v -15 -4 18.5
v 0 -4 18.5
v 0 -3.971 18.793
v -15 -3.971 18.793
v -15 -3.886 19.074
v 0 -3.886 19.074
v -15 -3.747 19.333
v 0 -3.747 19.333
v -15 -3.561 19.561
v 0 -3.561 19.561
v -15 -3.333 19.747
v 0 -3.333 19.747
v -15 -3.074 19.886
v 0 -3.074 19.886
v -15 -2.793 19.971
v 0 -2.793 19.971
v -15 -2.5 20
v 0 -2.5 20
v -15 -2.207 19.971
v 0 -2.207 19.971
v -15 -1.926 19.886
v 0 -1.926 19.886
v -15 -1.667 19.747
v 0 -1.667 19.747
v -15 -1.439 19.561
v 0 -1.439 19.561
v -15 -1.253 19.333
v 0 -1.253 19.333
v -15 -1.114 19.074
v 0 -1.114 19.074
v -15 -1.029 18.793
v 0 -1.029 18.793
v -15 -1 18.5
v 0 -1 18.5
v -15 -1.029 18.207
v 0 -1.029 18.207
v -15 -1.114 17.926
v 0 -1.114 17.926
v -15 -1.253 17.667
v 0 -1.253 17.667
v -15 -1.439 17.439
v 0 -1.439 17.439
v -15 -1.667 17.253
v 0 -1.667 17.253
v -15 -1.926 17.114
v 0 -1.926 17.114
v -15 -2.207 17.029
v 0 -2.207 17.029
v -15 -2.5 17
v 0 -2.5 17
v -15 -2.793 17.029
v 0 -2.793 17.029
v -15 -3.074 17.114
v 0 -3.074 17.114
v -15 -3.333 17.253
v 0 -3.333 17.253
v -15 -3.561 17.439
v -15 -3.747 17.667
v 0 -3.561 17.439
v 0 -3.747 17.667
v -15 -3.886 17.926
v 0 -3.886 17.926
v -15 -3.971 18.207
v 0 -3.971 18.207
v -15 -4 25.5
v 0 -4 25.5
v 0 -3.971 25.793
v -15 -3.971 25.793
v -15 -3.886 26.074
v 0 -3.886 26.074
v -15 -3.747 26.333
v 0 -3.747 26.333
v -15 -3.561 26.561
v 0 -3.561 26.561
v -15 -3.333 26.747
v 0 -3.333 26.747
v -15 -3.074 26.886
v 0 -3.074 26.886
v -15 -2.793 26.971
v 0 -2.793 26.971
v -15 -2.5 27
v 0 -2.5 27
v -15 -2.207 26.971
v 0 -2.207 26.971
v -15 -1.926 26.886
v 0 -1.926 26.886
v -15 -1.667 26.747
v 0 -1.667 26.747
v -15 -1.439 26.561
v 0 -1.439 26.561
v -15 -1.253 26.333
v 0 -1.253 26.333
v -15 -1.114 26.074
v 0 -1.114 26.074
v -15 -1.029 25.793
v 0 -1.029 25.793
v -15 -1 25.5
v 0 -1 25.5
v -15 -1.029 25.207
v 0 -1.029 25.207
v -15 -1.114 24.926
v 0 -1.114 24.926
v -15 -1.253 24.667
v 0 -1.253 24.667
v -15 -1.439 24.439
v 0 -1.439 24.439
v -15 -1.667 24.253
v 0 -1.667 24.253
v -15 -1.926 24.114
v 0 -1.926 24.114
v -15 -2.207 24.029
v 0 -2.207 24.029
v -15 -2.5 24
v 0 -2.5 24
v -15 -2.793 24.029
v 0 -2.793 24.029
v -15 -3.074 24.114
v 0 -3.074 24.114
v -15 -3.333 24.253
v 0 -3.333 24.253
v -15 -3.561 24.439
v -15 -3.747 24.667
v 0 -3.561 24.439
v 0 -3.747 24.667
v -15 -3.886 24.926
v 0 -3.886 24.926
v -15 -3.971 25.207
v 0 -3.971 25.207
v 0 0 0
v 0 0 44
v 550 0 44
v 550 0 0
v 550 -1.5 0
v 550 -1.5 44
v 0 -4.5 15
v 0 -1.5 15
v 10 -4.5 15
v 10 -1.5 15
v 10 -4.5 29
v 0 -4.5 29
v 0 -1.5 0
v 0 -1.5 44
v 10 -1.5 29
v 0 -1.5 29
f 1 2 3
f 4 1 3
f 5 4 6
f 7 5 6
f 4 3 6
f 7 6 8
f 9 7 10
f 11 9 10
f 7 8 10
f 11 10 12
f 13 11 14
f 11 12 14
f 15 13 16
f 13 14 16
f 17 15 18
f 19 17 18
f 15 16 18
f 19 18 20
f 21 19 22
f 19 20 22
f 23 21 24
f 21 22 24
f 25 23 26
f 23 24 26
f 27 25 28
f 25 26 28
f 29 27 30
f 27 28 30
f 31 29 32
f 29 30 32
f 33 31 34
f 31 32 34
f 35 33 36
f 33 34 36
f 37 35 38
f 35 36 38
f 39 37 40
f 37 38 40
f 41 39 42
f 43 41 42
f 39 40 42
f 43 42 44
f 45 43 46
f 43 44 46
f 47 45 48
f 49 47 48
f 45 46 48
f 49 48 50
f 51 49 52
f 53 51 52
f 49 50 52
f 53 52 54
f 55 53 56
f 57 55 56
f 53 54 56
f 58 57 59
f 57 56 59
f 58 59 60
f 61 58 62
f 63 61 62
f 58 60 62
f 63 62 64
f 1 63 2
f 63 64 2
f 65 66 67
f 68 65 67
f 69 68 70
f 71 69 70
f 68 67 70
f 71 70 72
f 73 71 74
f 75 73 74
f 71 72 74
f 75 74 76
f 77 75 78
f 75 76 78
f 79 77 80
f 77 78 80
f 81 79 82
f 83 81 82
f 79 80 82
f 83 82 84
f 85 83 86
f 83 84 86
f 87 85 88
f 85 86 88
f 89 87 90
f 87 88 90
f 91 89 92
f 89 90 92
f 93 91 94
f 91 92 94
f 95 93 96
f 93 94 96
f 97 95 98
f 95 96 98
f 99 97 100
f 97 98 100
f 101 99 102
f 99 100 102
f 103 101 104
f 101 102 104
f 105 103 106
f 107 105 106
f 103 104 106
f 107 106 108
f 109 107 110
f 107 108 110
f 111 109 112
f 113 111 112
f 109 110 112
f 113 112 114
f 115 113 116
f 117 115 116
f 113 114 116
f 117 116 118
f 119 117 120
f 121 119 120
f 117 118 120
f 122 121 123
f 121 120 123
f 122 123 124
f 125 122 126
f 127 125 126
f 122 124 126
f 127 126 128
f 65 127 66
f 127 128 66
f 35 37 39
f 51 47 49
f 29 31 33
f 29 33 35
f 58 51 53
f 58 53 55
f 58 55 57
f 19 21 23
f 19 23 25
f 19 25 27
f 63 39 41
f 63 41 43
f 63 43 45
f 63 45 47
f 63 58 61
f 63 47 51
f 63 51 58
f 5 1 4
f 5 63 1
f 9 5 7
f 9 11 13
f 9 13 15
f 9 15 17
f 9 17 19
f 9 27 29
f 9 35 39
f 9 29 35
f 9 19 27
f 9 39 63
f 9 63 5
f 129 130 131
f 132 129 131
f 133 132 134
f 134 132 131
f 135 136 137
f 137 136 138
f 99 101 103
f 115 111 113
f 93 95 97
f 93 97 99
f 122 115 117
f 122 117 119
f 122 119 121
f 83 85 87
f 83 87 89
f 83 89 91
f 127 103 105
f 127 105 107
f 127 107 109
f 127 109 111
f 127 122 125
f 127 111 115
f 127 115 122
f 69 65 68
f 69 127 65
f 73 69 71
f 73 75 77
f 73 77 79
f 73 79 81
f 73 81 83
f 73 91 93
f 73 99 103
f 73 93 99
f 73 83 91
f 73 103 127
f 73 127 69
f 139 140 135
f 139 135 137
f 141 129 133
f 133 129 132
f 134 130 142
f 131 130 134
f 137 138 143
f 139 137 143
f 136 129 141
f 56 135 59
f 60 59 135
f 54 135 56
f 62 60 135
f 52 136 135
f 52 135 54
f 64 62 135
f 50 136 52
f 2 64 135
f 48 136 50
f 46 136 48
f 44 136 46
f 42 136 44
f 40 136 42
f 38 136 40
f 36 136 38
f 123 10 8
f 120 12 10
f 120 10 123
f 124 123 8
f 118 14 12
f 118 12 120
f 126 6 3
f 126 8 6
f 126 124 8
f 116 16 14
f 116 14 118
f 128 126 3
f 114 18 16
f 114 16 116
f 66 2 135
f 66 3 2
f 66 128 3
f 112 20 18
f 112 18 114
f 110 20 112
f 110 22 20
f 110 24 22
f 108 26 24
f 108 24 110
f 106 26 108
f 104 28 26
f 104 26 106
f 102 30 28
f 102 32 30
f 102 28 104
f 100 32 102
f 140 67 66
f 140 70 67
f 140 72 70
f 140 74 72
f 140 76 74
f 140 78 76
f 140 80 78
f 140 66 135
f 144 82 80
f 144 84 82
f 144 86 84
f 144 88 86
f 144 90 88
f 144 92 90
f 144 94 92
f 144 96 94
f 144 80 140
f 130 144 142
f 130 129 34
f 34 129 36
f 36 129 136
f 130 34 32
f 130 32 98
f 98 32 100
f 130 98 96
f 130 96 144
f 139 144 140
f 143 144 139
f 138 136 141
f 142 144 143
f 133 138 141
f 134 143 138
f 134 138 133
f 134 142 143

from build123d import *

# Parameters (mm, degrees)
F0_W     = 550
F0_H     = 44
F1_DEPTH = 1.5
F2_W     = 10
F2_H     = 14
F3_DEPTH = 3
F4_R     = 1.5
F5_DEPTH = 15


with BuildPart() as f1:
    # F0 (on Front) → F1 (new body)
    with BuildSketch(Plane.XZ):
        with Locations((275, 22)):
            Rectangle(F0_W, F0_H)
    extrude(amount=F1_DEPTH)

    # F2 (on face) → F3 (join)
    with BuildSketch(Plane.XZ.offset(1.5)):
        with Locations((5, 22)):
            Rectangle(F2_W, F2_H)
    extrude(amount=F3_DEPTH)

    # F4 (on face) → F5 (join)
    with BuildSketch(Plane(origin=(0, 0, 0), x_dir=(0, -1, 0), z_dir=(-1, 0, 0))):
        with Locations((2.5, 25.5)):
            Circle(F4_R)
        with Locations((2.5, 18.5)):
            Circle(F4_R)
    extrude(amount=F5_DEPTH)


solid = f1.part
